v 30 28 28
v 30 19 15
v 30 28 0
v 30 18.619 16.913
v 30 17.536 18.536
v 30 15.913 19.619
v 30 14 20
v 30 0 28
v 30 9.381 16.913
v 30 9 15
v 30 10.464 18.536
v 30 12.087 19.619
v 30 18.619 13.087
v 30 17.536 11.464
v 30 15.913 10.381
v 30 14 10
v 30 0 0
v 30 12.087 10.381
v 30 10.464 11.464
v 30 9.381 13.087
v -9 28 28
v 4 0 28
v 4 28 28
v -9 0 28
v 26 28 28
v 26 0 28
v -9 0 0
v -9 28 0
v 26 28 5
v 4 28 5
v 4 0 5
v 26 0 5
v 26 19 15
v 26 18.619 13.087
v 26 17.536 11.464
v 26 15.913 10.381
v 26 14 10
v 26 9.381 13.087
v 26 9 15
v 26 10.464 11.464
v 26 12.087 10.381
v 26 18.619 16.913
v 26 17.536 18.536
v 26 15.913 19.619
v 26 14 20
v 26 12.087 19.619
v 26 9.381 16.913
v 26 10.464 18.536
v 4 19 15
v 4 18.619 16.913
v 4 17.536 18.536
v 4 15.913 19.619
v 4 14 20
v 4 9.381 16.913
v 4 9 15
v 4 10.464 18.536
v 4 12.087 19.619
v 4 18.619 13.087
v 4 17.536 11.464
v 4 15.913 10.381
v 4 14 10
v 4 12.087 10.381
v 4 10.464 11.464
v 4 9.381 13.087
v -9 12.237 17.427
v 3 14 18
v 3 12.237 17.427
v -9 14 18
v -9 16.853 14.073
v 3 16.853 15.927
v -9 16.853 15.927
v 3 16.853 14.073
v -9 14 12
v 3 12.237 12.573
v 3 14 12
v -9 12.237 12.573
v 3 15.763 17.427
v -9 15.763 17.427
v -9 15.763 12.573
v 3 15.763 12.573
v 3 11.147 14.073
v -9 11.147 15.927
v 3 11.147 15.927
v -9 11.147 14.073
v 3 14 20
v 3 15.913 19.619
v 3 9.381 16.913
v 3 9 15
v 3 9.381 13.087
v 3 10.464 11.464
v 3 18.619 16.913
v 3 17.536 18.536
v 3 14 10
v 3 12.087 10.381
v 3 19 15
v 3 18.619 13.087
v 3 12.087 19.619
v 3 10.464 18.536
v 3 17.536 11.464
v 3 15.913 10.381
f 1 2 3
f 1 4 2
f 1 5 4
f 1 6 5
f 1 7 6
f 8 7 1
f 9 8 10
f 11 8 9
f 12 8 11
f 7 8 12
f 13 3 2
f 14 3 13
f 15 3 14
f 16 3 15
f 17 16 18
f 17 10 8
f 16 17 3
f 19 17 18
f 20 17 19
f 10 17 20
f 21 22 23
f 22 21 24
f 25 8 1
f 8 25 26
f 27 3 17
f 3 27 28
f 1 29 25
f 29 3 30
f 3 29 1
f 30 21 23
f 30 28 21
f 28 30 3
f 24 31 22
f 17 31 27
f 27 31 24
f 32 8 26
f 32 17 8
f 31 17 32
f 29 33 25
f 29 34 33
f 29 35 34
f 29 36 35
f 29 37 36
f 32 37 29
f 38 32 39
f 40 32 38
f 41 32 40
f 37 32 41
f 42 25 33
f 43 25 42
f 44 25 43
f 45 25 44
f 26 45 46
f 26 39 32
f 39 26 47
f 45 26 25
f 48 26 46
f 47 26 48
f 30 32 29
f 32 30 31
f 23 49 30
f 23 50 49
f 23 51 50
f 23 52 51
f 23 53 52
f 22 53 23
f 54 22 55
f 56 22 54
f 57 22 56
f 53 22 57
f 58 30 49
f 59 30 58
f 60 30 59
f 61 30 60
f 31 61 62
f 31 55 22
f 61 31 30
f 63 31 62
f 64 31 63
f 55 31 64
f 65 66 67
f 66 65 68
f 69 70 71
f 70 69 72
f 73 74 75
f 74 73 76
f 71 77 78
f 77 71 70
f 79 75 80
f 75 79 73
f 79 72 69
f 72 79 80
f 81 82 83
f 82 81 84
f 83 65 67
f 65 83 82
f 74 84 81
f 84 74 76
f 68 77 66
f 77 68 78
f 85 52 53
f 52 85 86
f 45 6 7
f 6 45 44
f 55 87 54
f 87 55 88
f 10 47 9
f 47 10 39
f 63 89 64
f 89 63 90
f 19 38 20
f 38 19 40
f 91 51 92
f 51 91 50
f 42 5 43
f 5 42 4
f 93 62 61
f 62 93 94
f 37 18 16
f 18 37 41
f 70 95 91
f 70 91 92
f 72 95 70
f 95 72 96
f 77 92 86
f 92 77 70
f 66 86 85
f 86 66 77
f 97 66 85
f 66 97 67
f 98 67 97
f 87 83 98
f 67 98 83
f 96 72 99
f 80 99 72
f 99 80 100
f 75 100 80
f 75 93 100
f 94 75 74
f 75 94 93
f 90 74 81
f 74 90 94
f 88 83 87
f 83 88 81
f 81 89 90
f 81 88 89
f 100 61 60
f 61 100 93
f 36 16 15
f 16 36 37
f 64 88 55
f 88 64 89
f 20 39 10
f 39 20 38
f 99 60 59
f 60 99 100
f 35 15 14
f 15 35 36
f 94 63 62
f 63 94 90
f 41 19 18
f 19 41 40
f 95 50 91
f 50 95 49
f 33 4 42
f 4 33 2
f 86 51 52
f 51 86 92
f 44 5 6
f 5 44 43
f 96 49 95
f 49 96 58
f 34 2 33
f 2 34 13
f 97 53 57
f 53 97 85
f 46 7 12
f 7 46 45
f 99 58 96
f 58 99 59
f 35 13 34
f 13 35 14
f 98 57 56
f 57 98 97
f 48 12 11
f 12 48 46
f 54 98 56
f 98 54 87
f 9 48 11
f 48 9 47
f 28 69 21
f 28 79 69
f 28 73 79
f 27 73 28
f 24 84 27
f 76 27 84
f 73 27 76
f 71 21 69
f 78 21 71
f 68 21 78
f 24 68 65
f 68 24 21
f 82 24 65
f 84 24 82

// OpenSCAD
// @pabile 20180511
// U bracket openscad parametric customizeable customizer

uthick = 5; // bracket thickness
ulength = 22; // thickness of thing to insert inside bracket
uwidth = 30; // width of bracket arm;
udepth = 25; // height of bracket arm
screwhole = 3; // radius
driverhole = 5; // radius 

difference() {
    minkowski(){
        cube (size = [((uthick*2)+ulength)-2,uwidth-2,udepth+uthick-2]);
        // sphere(1);
    }

    # translate ([uthick-1,-2,uthick]) {
        cube (size = [ulength,uwidth+1,udepth]);
    }




    // screw hole
    # translate ([0,(uwidth/2)-1,(udepth/2)+(uthick/2)]) {
        rotate (a=[0,90,0]) cylinder (uthick*2,screwhole,screwhole,center=true);
    }
    
    // driver hole
    # translate ([uthick-2,(uwidth/2)-1,(udepth/2)+(uthick/2)]) {
        rotate (a=[0,90,0]) cylinder (ulength*2,driverhole,driverhole,center=false);
    }
}


difference() {
    
    translate ([uthick-14,-0,uthick-5]) {
        cube (size = [ulength-12,uwidth-2,udepth+3]);
    }
    
        // screw hole
    # translate ([0,(uwidth/2)-1,(udepth/2)+(uthick/2)]) {
        rotate (a=[0,90,0]) cylinder (uthick*4,screwhole,screwhole,center=true);
    }
}
